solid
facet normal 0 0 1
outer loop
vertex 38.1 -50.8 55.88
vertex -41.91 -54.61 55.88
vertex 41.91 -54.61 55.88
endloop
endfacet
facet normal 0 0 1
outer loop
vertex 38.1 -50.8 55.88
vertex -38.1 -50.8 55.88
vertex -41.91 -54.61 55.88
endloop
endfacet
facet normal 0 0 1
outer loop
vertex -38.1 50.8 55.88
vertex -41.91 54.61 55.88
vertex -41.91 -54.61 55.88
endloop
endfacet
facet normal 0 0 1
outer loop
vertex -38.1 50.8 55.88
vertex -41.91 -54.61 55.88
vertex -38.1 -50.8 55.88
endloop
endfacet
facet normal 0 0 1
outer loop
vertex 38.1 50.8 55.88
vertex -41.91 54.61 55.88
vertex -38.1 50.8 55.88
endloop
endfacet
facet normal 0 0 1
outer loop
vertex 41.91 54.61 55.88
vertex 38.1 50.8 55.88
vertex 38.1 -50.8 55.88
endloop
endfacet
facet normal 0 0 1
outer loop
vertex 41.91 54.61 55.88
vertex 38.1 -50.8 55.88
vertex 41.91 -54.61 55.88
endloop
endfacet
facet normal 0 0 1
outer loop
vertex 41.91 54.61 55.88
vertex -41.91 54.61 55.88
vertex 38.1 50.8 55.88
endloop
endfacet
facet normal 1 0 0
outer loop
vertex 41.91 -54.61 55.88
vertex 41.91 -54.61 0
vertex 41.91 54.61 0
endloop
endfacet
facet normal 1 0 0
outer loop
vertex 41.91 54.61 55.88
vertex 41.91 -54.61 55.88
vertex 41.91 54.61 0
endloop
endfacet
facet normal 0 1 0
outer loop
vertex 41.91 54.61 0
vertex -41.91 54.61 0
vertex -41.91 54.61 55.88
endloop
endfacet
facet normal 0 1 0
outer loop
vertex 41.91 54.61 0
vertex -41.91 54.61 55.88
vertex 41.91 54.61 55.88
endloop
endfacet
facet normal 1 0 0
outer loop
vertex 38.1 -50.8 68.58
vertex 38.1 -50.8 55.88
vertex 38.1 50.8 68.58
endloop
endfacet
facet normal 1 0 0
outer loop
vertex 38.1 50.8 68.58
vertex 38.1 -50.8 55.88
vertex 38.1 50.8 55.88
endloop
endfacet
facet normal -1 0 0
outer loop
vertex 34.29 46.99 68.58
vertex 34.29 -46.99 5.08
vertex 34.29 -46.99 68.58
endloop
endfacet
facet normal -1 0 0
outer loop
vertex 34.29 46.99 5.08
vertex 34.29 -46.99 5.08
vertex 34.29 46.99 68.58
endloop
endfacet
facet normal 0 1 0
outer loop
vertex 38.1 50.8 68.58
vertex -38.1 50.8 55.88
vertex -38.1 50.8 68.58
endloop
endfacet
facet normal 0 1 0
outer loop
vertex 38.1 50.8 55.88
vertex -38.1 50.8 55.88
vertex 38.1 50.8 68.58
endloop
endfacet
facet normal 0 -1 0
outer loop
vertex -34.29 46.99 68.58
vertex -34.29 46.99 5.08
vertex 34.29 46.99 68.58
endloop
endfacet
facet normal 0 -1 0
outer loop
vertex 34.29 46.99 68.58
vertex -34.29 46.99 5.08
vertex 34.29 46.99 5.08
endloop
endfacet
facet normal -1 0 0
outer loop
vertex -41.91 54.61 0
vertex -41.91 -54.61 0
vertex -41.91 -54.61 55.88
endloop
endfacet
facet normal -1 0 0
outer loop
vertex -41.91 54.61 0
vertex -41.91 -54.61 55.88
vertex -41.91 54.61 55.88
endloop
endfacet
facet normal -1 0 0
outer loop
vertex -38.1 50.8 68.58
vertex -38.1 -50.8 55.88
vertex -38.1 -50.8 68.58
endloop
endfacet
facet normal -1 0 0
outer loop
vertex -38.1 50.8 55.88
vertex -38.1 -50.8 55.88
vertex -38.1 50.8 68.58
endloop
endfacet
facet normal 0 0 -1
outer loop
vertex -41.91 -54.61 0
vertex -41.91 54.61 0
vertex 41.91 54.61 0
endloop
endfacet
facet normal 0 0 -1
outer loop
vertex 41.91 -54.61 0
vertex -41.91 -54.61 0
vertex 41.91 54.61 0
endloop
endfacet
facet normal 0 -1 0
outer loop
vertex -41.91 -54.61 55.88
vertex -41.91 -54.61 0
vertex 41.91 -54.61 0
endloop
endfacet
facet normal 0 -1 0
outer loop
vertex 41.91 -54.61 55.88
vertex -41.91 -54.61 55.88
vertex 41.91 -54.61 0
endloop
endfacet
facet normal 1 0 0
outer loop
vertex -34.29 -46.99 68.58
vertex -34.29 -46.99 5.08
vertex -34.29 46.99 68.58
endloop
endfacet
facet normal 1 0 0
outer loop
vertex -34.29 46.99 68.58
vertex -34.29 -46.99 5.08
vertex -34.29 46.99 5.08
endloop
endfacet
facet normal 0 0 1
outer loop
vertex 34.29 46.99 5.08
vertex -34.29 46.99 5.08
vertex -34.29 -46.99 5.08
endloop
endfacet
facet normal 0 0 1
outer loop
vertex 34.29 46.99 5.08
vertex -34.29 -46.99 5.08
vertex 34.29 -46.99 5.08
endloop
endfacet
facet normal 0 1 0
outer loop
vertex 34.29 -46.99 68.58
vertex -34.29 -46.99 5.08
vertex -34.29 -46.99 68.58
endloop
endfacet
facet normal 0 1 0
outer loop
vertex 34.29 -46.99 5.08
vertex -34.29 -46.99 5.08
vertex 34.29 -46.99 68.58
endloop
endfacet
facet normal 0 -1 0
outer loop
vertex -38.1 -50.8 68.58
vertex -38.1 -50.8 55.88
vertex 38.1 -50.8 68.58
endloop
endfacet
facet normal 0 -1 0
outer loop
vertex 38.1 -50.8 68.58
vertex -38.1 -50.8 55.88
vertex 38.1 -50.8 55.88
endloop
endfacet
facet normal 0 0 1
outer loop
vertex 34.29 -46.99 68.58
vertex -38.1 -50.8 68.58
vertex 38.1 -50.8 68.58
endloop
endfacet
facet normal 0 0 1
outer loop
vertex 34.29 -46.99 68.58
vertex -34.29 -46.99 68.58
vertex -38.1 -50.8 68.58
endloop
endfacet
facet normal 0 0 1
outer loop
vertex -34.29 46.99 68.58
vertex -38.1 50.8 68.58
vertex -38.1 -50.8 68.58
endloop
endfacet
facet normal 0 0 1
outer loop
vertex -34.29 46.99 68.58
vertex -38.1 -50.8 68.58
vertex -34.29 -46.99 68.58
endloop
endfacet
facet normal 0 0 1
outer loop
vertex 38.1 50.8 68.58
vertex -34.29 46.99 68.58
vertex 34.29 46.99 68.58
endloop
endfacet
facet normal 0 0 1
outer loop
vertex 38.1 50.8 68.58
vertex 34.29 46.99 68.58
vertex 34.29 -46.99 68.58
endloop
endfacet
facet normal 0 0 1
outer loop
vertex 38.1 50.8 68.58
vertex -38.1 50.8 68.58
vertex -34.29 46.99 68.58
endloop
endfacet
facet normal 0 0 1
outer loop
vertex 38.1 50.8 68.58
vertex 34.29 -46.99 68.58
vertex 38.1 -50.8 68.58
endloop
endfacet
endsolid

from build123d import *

# Parameters (mm, degrees)
F0_W     = 76.2
F0_H     = 101.6
F0_W_2   = 68.58
F0_H_2   = 93.98
F1_DEPTH = 68.58
F0_W_3   = 83.82
F0_H_3   = 109.22
F2_DEPTH = 55.88
F3_W     = 68.58
F3_H     = 93.98
F4_DEPTH = 5.08


with BuildPart() as f1:
    # F0 (on Top) → F1 (new body)
    with BuildSketch(Plane.XY):
        Rectangle(F0_W, F0_H)
        Rectangle(F0_W_2, F0_H_2, mode=Mode.SUBTRACT)
    extrude(amount=F1_DEPTH)

    # F0 (on Top) → F2 (join)
    with BuildSketch(Plane.XY):
        Rectangle(F0_W_3, F0_H_3)
        Rectangle(F0_W, F0_H, mode=Mode.SUBTRACT)
    extrude(amount=F2_DEPTH)

    # F3 (on Top) → F4 (join)
    with BuildSketch(Plane.XY):
        Rectangle(F3_W, F3_H)
    extrude(amount=F4_DEPTH)


solid = f1.part
